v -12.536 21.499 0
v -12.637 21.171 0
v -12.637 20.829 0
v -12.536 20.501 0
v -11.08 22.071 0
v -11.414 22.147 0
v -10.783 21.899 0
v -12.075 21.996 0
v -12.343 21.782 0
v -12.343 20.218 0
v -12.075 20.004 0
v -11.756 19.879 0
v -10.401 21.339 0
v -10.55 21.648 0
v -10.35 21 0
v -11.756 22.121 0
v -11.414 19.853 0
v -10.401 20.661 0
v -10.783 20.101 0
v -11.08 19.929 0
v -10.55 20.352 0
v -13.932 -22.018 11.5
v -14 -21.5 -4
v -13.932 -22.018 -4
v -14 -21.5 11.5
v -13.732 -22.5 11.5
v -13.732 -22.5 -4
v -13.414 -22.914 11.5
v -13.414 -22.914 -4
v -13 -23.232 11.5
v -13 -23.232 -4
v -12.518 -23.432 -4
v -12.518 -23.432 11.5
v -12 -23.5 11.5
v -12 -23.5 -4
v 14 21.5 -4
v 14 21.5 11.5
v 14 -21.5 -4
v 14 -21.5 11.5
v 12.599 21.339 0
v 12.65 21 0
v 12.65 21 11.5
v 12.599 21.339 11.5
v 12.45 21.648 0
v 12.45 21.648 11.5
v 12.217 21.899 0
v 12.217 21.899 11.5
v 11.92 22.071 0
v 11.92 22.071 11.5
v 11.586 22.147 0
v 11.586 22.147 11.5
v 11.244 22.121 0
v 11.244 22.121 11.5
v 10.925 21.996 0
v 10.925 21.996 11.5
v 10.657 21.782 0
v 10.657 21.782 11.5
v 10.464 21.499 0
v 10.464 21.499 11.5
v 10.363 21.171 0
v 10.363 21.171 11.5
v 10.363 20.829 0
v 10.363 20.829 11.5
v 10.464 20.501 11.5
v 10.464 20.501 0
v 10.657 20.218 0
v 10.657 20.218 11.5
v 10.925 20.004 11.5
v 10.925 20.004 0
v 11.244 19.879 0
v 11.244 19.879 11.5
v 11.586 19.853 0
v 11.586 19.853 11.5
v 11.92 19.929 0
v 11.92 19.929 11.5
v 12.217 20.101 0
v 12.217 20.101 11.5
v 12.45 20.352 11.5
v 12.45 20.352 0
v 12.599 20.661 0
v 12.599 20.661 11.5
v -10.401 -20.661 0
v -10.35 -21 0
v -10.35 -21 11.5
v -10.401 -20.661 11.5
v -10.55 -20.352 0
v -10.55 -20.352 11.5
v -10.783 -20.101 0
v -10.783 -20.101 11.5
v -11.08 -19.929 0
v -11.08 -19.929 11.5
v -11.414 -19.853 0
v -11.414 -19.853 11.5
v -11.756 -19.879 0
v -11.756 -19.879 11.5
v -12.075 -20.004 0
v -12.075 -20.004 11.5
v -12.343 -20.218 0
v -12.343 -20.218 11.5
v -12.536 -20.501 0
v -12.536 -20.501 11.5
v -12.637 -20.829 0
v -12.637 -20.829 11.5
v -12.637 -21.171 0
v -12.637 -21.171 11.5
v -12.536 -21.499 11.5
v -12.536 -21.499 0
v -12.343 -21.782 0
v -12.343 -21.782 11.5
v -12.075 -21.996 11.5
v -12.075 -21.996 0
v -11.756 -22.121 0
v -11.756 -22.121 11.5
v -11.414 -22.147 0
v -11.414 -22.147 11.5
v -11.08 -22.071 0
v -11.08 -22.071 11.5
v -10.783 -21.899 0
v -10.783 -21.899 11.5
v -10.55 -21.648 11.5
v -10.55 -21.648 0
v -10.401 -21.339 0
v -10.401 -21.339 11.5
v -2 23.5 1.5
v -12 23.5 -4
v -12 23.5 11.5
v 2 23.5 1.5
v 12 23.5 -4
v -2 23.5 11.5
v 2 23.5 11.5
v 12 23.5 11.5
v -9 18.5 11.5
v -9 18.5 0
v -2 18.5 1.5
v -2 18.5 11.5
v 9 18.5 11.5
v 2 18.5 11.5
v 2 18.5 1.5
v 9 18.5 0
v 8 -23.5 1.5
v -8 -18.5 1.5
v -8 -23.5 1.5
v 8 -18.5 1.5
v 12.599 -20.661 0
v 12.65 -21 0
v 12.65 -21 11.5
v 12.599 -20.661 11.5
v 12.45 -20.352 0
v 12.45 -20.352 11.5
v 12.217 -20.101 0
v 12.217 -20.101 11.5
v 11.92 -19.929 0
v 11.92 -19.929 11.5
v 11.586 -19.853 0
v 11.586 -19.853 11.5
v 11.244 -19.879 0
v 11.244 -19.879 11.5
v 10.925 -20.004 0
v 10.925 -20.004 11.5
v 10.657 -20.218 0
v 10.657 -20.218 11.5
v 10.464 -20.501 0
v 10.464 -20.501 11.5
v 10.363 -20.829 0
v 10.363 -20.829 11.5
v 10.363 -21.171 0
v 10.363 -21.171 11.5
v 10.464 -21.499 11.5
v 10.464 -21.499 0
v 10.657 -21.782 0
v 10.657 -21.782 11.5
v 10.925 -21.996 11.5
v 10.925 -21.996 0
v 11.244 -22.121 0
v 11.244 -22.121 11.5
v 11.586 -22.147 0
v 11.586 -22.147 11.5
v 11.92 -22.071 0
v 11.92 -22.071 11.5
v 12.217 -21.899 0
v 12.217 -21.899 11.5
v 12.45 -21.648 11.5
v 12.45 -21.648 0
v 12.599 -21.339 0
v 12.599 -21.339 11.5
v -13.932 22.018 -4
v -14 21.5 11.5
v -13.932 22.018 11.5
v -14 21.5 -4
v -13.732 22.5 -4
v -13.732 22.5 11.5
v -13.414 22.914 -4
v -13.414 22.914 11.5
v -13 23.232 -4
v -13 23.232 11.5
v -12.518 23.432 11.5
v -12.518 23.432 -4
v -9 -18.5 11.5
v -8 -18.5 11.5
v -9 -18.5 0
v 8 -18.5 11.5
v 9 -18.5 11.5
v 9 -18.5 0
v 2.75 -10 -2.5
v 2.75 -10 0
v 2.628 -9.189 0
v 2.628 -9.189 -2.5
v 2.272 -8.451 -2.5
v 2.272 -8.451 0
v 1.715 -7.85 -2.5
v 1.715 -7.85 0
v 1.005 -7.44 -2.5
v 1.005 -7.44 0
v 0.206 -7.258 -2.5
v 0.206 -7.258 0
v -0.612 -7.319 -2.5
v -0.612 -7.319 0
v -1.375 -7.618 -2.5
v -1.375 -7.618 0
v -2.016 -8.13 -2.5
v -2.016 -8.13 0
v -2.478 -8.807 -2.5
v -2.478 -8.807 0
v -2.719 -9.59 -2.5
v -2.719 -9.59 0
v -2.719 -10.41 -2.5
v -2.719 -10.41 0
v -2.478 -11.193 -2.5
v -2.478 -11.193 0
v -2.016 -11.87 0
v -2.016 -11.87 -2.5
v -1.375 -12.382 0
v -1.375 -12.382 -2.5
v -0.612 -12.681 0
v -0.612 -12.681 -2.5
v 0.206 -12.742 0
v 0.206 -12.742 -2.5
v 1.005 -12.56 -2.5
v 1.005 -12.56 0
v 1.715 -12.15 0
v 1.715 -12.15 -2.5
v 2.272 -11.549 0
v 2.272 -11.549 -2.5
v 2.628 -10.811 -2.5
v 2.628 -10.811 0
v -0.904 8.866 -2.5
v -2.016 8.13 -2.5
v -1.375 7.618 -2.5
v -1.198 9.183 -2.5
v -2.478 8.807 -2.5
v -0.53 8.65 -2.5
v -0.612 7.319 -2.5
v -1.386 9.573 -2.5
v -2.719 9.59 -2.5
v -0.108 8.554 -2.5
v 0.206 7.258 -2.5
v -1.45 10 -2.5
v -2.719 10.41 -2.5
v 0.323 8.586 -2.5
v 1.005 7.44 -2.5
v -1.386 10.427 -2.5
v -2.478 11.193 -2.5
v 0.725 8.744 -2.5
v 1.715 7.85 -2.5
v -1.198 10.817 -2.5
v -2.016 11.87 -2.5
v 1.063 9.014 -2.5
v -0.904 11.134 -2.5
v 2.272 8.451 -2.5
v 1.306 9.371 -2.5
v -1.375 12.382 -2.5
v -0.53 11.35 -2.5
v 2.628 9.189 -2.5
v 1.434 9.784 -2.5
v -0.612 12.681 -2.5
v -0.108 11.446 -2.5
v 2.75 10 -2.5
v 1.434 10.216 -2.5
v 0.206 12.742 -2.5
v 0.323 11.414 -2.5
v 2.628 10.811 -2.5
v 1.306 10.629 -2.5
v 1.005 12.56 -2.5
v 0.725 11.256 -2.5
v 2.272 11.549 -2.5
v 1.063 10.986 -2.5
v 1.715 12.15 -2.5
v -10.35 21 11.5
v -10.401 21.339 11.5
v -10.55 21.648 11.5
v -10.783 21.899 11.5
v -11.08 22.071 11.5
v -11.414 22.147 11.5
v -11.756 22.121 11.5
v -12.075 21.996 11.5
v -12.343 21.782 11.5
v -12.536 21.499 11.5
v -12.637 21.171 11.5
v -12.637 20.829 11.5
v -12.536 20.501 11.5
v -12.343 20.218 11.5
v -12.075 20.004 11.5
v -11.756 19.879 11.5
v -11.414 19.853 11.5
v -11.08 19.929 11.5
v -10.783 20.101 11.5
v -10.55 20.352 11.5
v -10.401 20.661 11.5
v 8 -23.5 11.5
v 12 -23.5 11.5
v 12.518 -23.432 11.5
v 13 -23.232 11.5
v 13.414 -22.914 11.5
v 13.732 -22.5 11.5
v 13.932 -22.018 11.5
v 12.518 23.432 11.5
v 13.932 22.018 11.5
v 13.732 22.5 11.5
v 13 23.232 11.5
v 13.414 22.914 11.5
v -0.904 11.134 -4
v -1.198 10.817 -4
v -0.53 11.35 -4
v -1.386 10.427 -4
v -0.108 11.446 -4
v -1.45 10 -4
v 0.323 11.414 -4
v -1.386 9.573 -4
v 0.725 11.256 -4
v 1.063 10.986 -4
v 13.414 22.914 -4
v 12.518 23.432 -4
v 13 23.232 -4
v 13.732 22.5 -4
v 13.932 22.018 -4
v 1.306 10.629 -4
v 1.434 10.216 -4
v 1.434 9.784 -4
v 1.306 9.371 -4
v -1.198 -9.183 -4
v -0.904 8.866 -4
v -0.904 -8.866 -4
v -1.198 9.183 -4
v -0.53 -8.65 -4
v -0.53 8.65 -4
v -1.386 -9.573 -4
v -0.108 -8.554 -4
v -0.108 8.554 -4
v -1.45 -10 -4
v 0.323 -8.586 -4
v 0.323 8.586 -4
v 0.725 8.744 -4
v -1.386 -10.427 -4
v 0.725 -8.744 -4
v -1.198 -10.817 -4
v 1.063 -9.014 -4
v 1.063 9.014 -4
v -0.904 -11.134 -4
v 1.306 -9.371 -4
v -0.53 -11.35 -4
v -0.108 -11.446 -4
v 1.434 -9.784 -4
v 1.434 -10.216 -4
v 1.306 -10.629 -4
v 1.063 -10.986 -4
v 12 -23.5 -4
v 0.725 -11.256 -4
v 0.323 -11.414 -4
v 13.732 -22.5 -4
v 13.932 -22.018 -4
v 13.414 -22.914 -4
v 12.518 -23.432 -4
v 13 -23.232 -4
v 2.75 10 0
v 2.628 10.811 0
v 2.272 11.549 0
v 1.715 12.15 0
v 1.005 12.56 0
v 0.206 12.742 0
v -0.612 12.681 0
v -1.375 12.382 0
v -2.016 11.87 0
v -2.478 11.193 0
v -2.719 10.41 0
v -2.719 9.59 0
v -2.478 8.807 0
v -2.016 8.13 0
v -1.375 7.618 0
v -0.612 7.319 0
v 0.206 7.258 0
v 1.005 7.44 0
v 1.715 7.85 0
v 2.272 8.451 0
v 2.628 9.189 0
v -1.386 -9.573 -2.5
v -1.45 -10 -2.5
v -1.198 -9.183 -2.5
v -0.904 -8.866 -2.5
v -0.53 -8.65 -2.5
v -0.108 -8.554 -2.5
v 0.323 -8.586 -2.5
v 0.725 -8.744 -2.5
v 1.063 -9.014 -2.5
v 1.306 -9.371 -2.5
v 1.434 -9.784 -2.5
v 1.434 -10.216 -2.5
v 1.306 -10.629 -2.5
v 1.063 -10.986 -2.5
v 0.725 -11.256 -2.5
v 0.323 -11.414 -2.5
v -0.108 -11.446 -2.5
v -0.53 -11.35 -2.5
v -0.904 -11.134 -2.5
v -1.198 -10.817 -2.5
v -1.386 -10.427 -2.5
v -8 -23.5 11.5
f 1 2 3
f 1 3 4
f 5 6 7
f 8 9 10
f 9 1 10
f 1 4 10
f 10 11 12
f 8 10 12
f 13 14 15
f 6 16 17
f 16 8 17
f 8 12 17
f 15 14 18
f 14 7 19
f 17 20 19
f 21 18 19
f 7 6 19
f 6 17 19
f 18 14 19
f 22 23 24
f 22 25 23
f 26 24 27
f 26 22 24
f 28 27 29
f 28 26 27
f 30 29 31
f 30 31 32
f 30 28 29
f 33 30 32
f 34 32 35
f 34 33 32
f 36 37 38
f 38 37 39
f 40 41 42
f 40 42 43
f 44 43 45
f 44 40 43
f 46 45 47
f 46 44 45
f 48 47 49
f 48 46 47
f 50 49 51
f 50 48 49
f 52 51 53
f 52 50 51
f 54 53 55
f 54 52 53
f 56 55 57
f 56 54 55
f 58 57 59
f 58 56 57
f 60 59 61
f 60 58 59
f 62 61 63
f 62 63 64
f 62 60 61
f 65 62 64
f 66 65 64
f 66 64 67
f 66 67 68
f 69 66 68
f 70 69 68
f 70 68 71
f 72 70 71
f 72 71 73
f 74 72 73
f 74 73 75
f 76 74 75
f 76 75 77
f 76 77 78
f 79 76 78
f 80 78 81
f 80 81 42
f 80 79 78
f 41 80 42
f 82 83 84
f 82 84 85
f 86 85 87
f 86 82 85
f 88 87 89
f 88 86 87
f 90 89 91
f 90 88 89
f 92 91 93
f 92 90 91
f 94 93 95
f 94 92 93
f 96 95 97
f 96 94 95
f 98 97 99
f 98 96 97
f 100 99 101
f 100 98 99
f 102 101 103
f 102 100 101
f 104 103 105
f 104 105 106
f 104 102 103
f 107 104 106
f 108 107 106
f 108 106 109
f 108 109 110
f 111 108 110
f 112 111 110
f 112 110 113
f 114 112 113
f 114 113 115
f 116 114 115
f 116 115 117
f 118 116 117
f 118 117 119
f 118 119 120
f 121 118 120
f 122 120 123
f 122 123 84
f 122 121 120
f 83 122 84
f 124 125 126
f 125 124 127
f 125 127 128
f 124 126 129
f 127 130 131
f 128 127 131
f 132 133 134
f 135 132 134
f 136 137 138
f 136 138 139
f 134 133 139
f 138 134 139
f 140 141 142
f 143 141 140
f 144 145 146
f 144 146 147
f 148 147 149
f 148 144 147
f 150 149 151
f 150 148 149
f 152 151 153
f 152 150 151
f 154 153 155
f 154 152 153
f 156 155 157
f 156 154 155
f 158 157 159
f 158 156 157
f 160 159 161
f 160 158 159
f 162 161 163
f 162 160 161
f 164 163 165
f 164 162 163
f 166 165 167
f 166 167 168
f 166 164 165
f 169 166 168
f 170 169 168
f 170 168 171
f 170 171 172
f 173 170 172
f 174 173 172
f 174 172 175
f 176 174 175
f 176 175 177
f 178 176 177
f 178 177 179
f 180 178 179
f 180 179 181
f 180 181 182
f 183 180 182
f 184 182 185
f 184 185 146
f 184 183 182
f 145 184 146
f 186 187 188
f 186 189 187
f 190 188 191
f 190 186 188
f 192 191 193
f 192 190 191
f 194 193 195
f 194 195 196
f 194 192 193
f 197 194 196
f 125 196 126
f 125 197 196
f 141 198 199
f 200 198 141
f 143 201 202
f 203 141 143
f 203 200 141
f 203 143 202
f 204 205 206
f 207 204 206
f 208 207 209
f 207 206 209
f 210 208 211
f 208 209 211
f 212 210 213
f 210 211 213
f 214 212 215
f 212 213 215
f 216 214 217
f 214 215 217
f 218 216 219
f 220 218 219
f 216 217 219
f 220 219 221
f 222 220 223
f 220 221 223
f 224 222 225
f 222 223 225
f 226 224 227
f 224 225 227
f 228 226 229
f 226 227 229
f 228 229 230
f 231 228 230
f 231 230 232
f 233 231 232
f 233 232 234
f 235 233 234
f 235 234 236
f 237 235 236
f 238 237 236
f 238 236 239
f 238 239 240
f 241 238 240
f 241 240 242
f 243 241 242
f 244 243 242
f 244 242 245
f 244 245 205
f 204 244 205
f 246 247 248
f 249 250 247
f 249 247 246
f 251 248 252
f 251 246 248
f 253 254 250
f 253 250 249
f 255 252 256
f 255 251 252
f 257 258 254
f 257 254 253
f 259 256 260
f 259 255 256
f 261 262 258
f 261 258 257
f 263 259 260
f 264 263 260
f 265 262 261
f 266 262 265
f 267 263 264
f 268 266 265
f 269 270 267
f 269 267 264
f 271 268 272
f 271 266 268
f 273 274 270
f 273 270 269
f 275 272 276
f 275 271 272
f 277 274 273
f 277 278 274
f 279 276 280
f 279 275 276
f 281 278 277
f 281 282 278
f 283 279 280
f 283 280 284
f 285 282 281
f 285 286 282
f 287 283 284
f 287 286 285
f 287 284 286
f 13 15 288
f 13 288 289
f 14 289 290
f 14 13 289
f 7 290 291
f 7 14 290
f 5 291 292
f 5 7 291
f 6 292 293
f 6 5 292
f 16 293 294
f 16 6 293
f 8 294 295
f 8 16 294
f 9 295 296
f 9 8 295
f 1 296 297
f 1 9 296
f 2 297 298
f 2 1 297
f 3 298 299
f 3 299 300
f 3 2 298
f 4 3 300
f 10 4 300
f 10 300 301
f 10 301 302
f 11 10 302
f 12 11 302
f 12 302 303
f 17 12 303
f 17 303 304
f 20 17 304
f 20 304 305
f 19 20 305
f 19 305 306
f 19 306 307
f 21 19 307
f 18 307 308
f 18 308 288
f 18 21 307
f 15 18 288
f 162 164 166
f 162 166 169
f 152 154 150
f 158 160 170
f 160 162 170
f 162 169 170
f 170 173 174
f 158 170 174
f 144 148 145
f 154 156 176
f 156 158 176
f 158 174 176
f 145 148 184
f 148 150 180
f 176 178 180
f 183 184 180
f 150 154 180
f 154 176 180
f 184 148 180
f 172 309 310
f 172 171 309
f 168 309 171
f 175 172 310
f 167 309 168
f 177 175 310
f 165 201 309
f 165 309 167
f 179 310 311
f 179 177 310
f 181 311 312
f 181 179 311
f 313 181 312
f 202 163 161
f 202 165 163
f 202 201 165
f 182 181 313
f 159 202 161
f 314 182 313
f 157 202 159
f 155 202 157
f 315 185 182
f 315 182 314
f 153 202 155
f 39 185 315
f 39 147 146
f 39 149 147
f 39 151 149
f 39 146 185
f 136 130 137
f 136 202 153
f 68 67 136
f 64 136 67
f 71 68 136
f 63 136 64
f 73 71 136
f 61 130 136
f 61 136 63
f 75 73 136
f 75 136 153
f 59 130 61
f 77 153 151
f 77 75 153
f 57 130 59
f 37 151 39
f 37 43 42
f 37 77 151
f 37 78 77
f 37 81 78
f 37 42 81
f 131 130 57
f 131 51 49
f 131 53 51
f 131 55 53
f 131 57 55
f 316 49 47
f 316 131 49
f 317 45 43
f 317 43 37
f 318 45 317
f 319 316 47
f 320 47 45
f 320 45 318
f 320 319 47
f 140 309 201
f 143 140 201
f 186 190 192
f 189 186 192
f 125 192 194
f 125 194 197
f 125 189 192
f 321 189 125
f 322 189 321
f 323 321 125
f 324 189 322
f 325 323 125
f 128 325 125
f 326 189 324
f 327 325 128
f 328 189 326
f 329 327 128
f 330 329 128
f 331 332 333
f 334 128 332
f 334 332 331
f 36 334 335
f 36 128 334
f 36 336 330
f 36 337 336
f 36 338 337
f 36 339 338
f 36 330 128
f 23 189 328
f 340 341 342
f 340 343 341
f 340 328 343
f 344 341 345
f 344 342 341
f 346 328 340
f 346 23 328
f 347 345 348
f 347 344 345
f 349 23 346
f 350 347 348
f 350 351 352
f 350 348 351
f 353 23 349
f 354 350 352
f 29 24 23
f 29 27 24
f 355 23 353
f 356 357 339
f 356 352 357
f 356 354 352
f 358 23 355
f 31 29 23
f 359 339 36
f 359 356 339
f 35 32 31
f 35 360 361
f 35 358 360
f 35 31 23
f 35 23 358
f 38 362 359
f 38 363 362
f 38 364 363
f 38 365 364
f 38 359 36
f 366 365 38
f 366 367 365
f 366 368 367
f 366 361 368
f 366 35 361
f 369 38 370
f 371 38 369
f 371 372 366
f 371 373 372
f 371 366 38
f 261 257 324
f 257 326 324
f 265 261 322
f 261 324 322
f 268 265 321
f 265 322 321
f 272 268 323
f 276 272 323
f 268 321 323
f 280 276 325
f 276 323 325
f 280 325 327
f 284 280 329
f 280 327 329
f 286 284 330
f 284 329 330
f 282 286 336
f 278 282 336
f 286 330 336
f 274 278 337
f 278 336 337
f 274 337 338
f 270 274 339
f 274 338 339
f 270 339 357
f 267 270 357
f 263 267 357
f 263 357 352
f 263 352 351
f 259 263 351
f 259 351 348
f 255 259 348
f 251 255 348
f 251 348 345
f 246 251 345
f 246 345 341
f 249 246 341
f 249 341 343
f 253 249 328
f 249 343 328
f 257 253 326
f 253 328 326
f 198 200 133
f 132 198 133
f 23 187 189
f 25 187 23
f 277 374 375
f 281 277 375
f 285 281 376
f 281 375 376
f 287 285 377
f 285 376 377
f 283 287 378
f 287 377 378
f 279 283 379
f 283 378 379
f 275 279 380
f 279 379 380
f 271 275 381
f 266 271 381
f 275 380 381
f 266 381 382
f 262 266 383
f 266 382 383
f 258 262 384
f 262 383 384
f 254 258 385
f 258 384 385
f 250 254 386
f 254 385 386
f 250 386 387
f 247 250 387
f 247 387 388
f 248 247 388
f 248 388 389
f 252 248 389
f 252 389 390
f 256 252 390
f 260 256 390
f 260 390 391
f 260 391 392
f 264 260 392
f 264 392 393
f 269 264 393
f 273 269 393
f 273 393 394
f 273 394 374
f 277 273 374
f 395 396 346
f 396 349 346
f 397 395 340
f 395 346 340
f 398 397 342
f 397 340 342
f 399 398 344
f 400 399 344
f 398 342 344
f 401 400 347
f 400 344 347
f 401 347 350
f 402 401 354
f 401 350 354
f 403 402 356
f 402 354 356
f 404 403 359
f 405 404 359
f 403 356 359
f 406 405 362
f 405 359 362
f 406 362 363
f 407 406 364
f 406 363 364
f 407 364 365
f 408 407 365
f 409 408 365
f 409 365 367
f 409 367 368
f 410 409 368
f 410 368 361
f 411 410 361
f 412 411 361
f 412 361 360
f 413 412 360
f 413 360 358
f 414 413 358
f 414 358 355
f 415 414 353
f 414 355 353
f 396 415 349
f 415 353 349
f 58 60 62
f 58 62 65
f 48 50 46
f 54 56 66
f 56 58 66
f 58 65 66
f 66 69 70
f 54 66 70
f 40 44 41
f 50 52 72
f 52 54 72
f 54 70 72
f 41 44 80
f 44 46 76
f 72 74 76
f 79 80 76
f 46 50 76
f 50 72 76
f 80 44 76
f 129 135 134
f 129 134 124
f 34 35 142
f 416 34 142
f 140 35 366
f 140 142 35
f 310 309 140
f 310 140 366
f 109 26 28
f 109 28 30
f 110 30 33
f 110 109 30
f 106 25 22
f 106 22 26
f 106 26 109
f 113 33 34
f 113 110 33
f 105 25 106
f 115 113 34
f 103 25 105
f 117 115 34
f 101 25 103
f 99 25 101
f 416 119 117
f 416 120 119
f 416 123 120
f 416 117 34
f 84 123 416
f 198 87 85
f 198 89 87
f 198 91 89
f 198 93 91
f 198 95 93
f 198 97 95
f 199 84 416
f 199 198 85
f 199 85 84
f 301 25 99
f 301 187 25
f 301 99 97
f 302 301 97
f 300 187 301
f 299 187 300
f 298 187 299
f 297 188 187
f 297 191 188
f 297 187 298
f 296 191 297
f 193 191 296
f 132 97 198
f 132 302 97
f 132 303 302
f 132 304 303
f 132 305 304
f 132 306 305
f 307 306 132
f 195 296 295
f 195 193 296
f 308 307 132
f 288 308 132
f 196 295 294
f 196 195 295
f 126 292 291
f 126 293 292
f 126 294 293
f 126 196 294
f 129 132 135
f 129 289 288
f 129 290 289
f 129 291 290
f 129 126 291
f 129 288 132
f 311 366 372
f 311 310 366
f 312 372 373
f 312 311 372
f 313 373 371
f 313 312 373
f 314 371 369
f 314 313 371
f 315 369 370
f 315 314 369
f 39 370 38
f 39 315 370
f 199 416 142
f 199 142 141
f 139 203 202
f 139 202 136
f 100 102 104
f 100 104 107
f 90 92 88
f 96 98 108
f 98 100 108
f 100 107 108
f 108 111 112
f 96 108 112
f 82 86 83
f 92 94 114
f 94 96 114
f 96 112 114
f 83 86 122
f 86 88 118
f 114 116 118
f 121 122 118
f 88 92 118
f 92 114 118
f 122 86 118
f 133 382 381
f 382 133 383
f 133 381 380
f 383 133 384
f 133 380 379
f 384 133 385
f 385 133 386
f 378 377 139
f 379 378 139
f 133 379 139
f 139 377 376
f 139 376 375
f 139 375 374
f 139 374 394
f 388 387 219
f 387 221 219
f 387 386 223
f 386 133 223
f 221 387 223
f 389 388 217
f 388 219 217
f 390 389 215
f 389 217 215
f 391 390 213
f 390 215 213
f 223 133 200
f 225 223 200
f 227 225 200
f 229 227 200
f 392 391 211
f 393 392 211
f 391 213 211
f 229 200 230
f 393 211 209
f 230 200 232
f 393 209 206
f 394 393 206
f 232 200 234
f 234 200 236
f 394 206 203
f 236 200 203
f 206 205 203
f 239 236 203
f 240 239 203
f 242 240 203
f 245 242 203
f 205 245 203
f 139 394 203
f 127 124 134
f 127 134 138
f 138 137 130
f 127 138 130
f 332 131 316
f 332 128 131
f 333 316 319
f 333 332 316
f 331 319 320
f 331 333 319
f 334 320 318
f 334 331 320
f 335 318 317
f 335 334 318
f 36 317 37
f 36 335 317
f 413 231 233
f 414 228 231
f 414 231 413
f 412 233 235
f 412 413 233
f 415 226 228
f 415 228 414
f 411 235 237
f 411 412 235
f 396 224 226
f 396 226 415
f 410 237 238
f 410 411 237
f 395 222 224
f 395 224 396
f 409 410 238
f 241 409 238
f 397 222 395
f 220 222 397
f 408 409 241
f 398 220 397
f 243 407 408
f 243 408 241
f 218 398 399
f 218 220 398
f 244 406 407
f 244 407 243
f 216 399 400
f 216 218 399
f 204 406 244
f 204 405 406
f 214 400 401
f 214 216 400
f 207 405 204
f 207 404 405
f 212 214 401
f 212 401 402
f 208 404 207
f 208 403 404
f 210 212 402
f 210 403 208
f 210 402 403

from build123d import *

# Parameters (mm, degrees)
F0_W           = 28
F0_H           = 47
F0_R           = 1.15
F0_W_2         = 18
F0_H_2         = 37
F1_DEPTH       = 11.5
F2_W           = 28
F2_H           = 47
F2_R           = 1.15
F2_W_2         = 18
F2_H_2         = 37
F3_DEPTH       = 4
F4_W           = 16
F4_H           = 5
F4_W_2         = 4
F5_DEPTH       = 10
F6_R           = 2
F8_D           = 2.9
F8_CBORE_D     = 5.5
F8_CBORE_DEPTH = 2.5


with BuildPart() as f1:
    # F0 (on Top) → F1 (new body)
    with BuildSketch(Plane.XY):
        Rectangle(F0_W, F0_H)
        with Locations((-11.5, -21)):
            Circle(F0_R, mode=Mode.SUBTRACT)
        with Locations((11.5, -21)):
            Circle(F0_R, mode=Mode.SUBTRACT)
        with Locations((-11.5, 21)):
            Circle(F0_R, mode=Mode.SUBTRACT)
        Rectangle(F0_W_2, F0_H_2, mode=Mode.SUBTRACT)
        with Locations((11.5, 21)):
            Circle(F0_R, mode=Mode.SUBTRACT)
    extrude(amount=F1_DEPTH)

    # F2 (on face) → F3 (join)
    with BuildSketch(Plane(origin=(0, 0, 0), x_dir=(1, 0, 0), z_dir=(0, 0, -1))):
        Rectangle(F2_W, F2_H)
        with Locations((-11.5, -21)):
            Circle(F2_R, mode=Mode.SUBTRACT)
        with Locations((11.5, -21)):
            Circle(F2_R, mode=Mode.SUBTRACT)
        with Locations((-11.5, 21)):
            Circle(F2_R, mode=Mode.SUBTRACT)
        Rectangle(F2_W_2, F2_H_2, mode=Mode.SUBTRACT)
        with Locations((11.5, 21)):
            Circle(F2_R, mode=Mode.SUBTRACT)
        with Locations((-11.5, 21)):
            Circle(F2_R)
        with Locations((11.5, 21)):
            Circle(F2_R)
        with Locations((-11.5, -21)):
            Circle(F2_R)
        Rectangle(F2_W_2, F2_H_2)
        with Locations((11.5, -21)):
            Circle(F2_R)
    extrude(amount=F3_DEPTH)

    # F4 (on face) → F5 (cut)
    with BuildSketch(Plane.XY.offset(11.5)):
        with Locations((0, -21)):
            Rectangle(F4_W, F4_H)
        with Locations((0, 21)):
            Rectangle(F4_W_2, F4_H)
    extrude(amount=-F5_DEPTH, mode=Mode.SUBTRACT)

    # F6
    f6_edges = [f1.edges().sort_by_distance(p)[0] for p in [
        (-14, 23.5, 3.75),
        (14, 23.5, 3.75),
        (14, -23.5, 3.75),
        (-14, -23.5, 3.75),
    ]]
    fillet(f6_edges, radius=F6_R)

    # F8 (through all)
    with Locations(Plane.XY):
        with Locations((0, 10), (0, -10)):
            CounterBoreHole(F8_D / 2, F8_CBORE_D / 2, F8_CBORE_DEPTH)


solid = f1.part
